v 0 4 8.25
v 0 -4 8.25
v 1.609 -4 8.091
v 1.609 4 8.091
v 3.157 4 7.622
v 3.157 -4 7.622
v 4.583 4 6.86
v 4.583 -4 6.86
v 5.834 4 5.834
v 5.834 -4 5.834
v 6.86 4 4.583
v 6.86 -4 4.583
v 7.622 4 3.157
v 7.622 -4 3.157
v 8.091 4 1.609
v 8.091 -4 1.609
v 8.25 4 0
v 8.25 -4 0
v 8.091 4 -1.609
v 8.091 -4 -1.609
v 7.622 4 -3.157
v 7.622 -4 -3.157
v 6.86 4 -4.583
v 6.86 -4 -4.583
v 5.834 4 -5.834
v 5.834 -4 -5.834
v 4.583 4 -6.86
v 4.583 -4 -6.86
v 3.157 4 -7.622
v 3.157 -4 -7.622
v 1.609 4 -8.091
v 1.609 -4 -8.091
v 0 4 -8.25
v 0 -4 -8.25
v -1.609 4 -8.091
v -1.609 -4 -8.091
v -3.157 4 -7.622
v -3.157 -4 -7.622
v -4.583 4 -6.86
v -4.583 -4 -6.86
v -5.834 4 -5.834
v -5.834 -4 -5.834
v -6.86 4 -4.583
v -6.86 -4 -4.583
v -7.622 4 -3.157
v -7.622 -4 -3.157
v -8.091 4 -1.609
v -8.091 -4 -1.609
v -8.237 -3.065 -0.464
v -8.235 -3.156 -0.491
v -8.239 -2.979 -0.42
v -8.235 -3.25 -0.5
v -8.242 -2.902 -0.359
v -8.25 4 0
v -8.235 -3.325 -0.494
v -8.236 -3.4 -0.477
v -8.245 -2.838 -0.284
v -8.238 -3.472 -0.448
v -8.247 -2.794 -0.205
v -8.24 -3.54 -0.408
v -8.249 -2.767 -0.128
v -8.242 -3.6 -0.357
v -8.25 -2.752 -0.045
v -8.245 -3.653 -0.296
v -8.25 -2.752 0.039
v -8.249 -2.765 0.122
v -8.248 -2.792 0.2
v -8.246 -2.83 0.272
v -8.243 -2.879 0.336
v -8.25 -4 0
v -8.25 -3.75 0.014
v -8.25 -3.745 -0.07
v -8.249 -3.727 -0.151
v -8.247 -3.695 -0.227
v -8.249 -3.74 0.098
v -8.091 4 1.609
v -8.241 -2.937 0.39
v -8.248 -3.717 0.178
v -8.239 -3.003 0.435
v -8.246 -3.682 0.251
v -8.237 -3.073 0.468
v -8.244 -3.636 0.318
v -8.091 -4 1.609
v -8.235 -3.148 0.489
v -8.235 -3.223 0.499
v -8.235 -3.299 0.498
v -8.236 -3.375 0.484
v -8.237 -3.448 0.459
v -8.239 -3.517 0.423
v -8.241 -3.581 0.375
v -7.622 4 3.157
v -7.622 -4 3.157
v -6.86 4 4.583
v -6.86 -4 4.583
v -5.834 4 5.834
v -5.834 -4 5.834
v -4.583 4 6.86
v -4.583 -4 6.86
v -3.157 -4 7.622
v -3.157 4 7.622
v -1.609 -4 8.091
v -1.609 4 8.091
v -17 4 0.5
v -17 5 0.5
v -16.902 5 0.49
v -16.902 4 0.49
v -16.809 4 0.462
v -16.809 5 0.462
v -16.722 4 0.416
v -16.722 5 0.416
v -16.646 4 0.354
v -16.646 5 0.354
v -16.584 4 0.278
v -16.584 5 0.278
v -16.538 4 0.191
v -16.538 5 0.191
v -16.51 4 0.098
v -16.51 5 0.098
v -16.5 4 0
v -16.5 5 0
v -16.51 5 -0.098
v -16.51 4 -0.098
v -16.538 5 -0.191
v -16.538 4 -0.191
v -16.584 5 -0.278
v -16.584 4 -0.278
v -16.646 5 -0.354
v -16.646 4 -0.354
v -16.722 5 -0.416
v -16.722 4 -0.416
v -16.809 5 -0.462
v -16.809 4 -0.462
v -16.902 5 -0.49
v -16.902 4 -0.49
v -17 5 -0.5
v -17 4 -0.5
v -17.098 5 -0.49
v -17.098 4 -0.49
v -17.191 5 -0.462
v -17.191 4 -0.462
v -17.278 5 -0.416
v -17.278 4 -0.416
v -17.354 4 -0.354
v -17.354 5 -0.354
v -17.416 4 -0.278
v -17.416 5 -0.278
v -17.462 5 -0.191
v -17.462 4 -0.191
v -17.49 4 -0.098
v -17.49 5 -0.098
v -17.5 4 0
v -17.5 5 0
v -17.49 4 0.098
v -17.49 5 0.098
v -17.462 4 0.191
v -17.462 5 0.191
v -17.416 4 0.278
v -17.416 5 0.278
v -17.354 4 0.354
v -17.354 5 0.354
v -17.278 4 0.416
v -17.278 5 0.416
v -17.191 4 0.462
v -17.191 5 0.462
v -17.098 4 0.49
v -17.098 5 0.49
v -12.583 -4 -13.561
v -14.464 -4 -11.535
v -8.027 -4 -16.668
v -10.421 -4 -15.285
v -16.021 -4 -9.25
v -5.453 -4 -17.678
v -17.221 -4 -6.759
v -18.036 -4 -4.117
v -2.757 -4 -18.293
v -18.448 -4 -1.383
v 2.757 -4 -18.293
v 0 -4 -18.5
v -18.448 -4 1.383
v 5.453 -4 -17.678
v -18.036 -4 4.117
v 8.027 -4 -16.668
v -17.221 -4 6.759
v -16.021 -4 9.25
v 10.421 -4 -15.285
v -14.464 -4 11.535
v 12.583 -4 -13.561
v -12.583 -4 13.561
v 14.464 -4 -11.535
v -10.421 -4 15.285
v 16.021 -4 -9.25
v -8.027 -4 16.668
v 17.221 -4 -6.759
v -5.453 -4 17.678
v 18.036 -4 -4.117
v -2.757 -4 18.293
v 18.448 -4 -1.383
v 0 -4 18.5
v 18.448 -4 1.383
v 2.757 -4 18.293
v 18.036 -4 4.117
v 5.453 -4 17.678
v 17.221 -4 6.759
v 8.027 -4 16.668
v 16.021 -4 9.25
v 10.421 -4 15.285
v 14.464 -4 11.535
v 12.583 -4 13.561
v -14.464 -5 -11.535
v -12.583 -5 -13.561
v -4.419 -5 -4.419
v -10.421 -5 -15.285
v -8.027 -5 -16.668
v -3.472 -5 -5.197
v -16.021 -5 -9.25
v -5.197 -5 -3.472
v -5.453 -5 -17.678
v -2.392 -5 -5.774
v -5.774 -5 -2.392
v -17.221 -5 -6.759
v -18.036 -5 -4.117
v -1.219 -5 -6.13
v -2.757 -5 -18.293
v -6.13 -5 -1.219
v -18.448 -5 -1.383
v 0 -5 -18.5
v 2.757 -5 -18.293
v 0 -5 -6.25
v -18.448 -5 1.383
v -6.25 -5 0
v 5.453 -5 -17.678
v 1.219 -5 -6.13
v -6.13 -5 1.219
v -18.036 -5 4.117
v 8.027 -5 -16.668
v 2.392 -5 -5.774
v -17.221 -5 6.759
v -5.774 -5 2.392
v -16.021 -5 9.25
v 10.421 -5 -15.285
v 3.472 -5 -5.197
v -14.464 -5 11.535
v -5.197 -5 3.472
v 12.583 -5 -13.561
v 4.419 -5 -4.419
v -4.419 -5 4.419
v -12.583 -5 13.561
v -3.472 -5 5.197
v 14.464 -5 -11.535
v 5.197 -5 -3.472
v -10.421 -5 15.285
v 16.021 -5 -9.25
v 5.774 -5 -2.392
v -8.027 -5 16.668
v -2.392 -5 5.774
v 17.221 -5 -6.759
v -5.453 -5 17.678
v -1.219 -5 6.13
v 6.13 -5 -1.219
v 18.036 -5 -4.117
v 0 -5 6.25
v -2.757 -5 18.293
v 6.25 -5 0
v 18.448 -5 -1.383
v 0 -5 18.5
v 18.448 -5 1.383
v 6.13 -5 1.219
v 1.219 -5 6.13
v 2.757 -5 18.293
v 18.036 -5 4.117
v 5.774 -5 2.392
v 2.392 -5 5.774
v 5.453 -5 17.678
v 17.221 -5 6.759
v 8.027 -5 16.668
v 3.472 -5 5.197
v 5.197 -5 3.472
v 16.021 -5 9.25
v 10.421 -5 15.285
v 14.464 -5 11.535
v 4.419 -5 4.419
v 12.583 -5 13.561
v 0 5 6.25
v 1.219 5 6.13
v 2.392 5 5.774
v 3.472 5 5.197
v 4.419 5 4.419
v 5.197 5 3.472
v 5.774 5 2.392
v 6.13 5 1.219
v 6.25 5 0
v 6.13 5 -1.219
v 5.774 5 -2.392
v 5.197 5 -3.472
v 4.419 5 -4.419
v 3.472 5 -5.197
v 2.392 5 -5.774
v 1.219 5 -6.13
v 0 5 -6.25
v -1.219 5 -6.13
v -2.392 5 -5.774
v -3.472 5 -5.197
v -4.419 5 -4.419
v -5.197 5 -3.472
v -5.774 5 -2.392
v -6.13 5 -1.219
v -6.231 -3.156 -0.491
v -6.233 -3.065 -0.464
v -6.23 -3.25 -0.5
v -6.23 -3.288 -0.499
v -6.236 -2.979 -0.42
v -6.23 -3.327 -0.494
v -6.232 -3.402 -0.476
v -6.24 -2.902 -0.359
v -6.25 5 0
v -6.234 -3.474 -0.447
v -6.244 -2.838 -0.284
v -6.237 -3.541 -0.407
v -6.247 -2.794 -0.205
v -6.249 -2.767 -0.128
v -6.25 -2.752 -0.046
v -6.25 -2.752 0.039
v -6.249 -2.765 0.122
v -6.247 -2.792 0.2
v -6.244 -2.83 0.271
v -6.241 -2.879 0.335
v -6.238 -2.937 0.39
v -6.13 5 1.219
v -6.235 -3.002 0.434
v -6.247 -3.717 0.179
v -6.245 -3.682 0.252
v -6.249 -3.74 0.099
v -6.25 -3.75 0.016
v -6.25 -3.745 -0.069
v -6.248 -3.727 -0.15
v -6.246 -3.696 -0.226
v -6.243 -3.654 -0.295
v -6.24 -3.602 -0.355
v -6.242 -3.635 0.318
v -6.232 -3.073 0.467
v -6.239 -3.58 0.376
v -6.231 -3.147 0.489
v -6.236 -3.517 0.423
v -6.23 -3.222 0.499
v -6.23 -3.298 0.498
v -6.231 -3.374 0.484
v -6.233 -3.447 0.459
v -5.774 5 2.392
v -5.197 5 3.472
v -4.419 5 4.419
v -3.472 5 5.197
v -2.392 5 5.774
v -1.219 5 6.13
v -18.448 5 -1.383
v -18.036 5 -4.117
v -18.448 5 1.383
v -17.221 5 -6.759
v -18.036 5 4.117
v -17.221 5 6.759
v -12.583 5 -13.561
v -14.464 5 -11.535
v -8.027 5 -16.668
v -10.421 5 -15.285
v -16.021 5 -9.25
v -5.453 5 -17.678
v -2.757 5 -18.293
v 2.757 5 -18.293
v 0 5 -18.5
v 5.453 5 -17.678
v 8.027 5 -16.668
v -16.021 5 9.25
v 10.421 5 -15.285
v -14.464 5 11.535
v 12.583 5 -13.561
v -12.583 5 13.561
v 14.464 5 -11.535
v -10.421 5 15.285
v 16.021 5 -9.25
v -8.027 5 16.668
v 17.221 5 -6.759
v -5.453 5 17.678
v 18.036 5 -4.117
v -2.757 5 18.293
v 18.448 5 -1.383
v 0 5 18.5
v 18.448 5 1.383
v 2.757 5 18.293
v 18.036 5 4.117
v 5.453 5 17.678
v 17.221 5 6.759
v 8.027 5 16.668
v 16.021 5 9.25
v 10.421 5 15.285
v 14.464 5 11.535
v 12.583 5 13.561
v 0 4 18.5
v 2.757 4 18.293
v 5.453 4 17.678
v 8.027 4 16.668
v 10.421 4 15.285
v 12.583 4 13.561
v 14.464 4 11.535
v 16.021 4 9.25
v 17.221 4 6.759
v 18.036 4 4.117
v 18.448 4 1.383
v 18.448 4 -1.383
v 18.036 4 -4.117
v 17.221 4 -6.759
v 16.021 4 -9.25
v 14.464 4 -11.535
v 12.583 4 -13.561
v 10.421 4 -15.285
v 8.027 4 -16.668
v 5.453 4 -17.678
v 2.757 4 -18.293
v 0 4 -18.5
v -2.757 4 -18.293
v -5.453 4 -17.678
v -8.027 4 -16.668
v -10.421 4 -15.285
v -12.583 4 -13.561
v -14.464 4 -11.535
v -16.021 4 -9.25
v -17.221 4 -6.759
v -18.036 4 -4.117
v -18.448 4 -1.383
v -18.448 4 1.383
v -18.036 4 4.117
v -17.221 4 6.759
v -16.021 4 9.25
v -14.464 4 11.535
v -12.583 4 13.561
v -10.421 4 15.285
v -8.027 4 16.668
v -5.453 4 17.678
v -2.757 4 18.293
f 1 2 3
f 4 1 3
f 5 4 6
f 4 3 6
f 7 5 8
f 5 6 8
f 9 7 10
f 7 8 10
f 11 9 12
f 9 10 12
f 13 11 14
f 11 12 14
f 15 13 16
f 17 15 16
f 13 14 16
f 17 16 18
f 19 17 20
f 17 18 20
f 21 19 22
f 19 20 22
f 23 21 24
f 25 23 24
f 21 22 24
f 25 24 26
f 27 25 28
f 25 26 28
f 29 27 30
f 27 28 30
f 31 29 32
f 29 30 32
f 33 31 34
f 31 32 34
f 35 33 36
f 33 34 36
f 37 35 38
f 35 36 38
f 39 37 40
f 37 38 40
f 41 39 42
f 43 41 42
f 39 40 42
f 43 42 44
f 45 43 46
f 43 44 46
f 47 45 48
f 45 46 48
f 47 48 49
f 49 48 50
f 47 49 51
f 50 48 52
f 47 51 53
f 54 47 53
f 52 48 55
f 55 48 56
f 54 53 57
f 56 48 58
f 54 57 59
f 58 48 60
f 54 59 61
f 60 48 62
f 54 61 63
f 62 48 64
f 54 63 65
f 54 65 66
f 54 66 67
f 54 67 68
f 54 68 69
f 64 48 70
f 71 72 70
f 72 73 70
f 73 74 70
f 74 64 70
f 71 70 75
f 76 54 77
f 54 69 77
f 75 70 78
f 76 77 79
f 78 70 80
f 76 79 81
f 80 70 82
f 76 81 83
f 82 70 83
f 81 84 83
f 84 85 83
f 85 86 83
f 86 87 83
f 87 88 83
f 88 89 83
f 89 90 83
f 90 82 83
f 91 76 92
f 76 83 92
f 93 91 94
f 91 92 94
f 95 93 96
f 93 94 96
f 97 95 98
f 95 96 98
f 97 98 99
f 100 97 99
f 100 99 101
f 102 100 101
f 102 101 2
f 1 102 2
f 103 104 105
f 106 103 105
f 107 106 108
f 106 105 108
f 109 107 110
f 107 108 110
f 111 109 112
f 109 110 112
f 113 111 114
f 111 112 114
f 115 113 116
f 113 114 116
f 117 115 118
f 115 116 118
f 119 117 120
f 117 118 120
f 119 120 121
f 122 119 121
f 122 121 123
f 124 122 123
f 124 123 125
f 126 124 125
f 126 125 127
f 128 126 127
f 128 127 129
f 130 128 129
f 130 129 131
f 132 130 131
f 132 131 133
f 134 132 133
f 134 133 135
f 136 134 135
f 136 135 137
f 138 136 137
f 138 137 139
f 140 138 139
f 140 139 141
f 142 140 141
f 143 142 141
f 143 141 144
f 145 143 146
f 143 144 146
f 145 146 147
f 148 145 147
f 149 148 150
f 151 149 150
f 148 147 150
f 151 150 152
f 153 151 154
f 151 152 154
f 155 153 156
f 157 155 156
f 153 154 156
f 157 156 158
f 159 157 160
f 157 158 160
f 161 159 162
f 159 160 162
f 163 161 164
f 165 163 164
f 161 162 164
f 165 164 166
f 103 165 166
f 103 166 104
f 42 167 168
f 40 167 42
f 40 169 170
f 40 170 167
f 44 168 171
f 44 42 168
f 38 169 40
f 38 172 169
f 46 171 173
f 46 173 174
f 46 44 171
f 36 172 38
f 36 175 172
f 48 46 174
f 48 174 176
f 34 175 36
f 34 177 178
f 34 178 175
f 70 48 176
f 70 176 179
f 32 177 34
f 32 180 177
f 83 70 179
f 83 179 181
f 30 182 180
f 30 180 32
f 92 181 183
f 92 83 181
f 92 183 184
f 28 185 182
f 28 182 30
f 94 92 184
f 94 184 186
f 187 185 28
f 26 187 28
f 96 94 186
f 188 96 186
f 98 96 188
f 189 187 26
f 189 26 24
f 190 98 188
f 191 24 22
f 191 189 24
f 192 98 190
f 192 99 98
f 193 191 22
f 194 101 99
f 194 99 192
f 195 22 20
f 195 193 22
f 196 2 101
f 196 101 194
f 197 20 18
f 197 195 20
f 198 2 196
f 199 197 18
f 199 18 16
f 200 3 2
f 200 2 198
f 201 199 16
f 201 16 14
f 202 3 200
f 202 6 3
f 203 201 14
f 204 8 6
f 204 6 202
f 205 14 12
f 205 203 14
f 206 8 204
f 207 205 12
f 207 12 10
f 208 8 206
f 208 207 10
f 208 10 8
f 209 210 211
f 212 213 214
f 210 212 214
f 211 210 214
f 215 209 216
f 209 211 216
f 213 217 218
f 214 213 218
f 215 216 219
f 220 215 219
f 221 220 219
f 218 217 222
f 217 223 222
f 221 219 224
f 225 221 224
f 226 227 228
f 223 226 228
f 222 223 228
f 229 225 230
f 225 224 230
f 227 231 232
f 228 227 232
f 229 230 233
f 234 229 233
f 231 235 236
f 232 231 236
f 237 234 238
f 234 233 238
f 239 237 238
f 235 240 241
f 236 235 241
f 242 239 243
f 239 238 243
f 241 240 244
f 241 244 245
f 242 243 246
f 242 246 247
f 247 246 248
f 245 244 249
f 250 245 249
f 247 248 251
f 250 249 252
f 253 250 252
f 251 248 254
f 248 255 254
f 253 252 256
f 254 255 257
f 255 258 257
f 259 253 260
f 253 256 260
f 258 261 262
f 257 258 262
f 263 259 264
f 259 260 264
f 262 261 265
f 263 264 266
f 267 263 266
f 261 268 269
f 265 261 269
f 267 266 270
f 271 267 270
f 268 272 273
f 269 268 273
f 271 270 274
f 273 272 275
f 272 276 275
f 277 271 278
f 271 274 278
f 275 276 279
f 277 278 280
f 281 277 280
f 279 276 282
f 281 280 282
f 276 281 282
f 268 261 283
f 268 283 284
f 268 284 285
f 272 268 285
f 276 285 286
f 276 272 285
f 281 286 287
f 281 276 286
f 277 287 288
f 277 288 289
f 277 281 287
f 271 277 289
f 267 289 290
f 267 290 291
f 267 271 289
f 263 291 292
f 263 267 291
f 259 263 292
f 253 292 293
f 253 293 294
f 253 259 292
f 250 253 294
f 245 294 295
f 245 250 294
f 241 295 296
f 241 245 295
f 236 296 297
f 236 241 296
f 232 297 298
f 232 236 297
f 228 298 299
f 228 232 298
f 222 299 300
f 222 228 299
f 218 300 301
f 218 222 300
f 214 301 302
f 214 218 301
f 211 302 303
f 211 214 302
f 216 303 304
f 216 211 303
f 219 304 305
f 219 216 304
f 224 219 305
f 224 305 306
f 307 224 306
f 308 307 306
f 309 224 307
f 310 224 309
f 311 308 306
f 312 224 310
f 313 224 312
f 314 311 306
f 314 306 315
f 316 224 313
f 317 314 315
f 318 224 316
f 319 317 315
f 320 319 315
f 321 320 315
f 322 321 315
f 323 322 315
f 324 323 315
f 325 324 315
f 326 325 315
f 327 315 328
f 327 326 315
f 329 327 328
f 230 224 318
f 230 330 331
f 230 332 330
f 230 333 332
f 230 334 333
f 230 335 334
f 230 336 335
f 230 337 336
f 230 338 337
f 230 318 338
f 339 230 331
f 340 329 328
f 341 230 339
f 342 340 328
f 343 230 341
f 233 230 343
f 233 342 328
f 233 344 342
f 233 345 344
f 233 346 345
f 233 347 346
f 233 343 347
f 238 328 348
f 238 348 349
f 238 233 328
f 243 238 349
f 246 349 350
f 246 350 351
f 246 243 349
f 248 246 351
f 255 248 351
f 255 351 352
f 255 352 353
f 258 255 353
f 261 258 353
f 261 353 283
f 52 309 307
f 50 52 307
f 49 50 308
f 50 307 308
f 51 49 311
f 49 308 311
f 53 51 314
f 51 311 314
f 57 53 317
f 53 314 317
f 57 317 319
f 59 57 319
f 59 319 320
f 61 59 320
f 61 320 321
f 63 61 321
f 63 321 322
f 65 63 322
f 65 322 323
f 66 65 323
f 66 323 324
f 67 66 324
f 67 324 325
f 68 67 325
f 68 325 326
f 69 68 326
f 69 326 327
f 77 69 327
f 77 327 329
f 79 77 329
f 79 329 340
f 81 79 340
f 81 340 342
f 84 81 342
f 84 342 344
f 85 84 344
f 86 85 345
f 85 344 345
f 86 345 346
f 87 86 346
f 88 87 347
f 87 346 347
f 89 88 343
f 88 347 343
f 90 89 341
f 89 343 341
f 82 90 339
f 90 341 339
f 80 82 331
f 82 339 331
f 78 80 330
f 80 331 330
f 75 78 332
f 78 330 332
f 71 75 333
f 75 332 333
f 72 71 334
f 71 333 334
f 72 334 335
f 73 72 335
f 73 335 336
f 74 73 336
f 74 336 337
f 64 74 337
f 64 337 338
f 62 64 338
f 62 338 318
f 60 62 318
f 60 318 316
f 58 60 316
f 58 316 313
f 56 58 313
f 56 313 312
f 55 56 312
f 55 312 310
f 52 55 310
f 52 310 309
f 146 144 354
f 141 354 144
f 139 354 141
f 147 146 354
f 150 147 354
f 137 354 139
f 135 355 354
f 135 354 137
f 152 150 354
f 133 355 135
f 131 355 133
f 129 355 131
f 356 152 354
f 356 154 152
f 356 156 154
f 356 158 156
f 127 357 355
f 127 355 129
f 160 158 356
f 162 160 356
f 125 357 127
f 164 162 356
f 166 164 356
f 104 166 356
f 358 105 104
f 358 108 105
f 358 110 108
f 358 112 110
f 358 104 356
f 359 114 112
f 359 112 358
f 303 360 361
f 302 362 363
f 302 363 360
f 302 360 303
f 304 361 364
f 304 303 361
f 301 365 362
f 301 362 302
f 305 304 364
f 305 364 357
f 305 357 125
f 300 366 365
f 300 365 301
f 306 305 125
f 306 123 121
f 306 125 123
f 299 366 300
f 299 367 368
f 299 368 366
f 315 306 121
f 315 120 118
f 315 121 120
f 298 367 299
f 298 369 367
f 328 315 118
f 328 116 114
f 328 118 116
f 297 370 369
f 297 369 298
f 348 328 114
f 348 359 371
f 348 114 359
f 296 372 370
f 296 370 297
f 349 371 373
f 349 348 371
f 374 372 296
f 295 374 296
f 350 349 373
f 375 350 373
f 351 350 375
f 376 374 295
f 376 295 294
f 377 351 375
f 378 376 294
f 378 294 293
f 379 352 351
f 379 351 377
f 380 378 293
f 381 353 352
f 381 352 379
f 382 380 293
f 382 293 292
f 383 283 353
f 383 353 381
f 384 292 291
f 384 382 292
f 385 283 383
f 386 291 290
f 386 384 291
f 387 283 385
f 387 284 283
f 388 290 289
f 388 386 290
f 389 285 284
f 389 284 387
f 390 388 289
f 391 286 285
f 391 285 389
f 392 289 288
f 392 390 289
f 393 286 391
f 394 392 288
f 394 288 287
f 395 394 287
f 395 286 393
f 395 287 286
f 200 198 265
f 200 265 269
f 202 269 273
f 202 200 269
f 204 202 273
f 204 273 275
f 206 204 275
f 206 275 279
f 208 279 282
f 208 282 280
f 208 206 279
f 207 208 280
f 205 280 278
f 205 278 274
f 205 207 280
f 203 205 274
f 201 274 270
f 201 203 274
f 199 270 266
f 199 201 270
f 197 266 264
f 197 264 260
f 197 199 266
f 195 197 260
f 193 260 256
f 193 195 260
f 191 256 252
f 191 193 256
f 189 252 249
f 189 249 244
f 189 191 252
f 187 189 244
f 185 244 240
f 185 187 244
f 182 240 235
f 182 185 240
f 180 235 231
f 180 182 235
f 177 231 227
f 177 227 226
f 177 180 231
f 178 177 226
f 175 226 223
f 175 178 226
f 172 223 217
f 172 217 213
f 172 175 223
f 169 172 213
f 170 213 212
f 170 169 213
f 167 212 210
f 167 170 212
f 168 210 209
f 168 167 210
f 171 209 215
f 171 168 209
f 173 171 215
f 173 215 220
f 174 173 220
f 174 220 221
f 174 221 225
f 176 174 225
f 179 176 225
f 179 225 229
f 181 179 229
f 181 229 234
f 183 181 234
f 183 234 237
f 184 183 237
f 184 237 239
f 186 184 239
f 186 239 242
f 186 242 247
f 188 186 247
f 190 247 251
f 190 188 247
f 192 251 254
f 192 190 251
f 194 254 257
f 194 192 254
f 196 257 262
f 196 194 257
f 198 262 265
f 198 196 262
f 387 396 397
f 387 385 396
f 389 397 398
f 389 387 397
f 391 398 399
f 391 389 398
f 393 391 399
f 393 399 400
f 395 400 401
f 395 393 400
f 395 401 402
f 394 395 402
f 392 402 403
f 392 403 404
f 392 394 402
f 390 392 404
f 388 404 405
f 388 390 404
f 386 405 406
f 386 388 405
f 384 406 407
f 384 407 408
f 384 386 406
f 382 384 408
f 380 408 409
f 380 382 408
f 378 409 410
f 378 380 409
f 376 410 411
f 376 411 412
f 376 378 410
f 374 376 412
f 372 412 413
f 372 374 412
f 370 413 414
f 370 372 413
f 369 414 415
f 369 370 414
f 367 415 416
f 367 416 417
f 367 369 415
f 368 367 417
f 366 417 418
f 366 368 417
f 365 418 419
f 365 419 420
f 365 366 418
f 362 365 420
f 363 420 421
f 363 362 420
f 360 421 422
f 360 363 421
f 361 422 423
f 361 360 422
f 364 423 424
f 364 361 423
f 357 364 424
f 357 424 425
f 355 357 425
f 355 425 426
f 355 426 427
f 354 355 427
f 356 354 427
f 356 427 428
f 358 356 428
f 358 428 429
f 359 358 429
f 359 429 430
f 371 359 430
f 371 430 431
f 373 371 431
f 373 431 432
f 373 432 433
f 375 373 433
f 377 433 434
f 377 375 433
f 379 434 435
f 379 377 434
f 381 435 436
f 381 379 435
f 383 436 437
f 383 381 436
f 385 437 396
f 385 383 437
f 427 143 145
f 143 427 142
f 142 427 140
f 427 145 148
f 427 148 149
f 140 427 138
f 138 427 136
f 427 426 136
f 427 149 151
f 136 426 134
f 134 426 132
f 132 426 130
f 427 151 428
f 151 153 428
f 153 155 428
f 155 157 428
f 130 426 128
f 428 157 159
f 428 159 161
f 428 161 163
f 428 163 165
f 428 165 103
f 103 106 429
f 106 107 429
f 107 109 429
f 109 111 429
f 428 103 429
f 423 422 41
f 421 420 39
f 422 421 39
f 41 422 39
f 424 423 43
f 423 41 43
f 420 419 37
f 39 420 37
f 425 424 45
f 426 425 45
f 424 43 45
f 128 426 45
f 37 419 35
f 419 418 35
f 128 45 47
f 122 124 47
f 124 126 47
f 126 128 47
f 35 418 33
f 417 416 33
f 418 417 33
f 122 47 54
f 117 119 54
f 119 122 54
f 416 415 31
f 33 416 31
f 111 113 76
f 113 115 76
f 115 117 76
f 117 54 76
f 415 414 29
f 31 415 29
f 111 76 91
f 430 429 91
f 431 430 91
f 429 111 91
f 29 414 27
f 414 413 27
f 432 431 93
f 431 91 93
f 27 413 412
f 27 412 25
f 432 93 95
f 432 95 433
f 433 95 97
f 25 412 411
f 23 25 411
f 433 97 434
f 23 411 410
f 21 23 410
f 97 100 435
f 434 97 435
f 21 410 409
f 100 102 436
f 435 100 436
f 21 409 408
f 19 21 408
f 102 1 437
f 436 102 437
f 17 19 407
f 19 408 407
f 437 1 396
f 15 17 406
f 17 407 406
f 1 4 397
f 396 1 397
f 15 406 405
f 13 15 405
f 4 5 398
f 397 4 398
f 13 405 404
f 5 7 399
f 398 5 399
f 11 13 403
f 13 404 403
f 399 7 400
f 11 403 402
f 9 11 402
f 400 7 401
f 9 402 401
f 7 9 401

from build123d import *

# Parameters (mm, degrees)
SKETCH_2_R          = 6.75
SKETCH_2_R_2        = 6.25
EXTRUDE_1_DEPTH     = 5
SKETCH_3_R          = 18.5
SKETCH_3_R_2        = 6.75
EXTRUDE_4_DEPTH     = 5
SKETCH_6_R          = 18.5
SKETCH_6_R_2        = 8.25
CUT_EXTRUDE_3_DEPTH = 4
SKETCH_7_R          = 0.5
CUT_EXTRUDE_4_DEPTH = 27.636441204
CUT_EXTRUDE_5_REACH = 30.009
SKETCH_8_R          = 0.5


with BuildPart() as part:
    # 草图2 → 凸台-拉伸1 (new, symmetric)
    with BuildSketch(Plane(origin=(0, 0, 0), x_dir=(1, 0, 0), z_dir=(0, 1, 0))):
        with Locations(Location((0, 0, 0), (0, 0, 270))):
            Circle(SKETCH_2_R)
        with Locations(Location((0, 0, 0), (0, 0, 270))):
            Circle(SKETCH_2_R_2, mode=Mode.SUBTRACT)
    extrude(amount=EXTRUDE_1_DEPTH, both=True)

    # 草图3 → 凸台-拉伸4 (add, symmetric)
    with BuildSketch(Plane(origin=(0, 0, 0), x_dir=(1, 0, 0), z_dir=(0, 1, 0))):
        with Locations(Location((0, 0, 0), (0, 0, 270))):
            Circle(SKETCH_3_R)
        Circle(SKETCH_3_R_2, mode=Mode.SUBTRACT)
    extrude(amount=EXTRUDE_4_DEPTH, both=True)

    # 草图6 → 切除-拉伸3 (cut, symmetric)
    with BuildSketch(Plane(origin=(0, 0, 0), x_dir=(1, 0, 0), z_dir=(0, 1, 0))):
        with Locations(Location((0, 0, 0), (0, 0, 270))):
            Circle(SKETCH_6_R)
        with Locations(Location((0, 0, 0), (0, 0, 270))):
            Circle(SKETCH_6_R_2, mode=Mode.SUBTRACT)
    extrude(amount=CUT_EXTRUDE_3_DEPTH, both=True, mode=Mode.SUBTRACT)

    # 草图7 → 切除-拉伸4 (cut, through all)
    with BuildSketch(Plane(origin=(0, 0, 0), x_dir=(0, 0, -1), z_dir=(1, 0, 0))):
        with Locations((0, -3.25)):
            Circle(SKETCH_7_R)
    extrude(amount=-CUT_EXTRUDE_4_DEPTH, mode=Mode.SUBTRACT)

    # 草图8 → 切除-拉伸5 (cut, up to next)
    with BuildSketch(Plane(origin=(0, 5, 0), x_dir=(1, 0, 0), z_dir=(0, 1, 0)), mode=Mode.PRIVATE) as cut_extrude_5_sk1:
        with Locations(Location((-17, 0, 0), (0, 0, 270))):
            Circle(SKETCH_8_R)
    cut_extrude_5_tool1 = extrude(cut_extrude_5_sk1.sketch, amount=-CUT_EXTRUDE_5_REACH, mode=Mode.PRIVATE) & part.part
    add(cut_extrude_5_tool1.solids().sort_by_distance((-17, 5, 0))[0], mode=Mode.SUBTRACT)


solid = part.part
